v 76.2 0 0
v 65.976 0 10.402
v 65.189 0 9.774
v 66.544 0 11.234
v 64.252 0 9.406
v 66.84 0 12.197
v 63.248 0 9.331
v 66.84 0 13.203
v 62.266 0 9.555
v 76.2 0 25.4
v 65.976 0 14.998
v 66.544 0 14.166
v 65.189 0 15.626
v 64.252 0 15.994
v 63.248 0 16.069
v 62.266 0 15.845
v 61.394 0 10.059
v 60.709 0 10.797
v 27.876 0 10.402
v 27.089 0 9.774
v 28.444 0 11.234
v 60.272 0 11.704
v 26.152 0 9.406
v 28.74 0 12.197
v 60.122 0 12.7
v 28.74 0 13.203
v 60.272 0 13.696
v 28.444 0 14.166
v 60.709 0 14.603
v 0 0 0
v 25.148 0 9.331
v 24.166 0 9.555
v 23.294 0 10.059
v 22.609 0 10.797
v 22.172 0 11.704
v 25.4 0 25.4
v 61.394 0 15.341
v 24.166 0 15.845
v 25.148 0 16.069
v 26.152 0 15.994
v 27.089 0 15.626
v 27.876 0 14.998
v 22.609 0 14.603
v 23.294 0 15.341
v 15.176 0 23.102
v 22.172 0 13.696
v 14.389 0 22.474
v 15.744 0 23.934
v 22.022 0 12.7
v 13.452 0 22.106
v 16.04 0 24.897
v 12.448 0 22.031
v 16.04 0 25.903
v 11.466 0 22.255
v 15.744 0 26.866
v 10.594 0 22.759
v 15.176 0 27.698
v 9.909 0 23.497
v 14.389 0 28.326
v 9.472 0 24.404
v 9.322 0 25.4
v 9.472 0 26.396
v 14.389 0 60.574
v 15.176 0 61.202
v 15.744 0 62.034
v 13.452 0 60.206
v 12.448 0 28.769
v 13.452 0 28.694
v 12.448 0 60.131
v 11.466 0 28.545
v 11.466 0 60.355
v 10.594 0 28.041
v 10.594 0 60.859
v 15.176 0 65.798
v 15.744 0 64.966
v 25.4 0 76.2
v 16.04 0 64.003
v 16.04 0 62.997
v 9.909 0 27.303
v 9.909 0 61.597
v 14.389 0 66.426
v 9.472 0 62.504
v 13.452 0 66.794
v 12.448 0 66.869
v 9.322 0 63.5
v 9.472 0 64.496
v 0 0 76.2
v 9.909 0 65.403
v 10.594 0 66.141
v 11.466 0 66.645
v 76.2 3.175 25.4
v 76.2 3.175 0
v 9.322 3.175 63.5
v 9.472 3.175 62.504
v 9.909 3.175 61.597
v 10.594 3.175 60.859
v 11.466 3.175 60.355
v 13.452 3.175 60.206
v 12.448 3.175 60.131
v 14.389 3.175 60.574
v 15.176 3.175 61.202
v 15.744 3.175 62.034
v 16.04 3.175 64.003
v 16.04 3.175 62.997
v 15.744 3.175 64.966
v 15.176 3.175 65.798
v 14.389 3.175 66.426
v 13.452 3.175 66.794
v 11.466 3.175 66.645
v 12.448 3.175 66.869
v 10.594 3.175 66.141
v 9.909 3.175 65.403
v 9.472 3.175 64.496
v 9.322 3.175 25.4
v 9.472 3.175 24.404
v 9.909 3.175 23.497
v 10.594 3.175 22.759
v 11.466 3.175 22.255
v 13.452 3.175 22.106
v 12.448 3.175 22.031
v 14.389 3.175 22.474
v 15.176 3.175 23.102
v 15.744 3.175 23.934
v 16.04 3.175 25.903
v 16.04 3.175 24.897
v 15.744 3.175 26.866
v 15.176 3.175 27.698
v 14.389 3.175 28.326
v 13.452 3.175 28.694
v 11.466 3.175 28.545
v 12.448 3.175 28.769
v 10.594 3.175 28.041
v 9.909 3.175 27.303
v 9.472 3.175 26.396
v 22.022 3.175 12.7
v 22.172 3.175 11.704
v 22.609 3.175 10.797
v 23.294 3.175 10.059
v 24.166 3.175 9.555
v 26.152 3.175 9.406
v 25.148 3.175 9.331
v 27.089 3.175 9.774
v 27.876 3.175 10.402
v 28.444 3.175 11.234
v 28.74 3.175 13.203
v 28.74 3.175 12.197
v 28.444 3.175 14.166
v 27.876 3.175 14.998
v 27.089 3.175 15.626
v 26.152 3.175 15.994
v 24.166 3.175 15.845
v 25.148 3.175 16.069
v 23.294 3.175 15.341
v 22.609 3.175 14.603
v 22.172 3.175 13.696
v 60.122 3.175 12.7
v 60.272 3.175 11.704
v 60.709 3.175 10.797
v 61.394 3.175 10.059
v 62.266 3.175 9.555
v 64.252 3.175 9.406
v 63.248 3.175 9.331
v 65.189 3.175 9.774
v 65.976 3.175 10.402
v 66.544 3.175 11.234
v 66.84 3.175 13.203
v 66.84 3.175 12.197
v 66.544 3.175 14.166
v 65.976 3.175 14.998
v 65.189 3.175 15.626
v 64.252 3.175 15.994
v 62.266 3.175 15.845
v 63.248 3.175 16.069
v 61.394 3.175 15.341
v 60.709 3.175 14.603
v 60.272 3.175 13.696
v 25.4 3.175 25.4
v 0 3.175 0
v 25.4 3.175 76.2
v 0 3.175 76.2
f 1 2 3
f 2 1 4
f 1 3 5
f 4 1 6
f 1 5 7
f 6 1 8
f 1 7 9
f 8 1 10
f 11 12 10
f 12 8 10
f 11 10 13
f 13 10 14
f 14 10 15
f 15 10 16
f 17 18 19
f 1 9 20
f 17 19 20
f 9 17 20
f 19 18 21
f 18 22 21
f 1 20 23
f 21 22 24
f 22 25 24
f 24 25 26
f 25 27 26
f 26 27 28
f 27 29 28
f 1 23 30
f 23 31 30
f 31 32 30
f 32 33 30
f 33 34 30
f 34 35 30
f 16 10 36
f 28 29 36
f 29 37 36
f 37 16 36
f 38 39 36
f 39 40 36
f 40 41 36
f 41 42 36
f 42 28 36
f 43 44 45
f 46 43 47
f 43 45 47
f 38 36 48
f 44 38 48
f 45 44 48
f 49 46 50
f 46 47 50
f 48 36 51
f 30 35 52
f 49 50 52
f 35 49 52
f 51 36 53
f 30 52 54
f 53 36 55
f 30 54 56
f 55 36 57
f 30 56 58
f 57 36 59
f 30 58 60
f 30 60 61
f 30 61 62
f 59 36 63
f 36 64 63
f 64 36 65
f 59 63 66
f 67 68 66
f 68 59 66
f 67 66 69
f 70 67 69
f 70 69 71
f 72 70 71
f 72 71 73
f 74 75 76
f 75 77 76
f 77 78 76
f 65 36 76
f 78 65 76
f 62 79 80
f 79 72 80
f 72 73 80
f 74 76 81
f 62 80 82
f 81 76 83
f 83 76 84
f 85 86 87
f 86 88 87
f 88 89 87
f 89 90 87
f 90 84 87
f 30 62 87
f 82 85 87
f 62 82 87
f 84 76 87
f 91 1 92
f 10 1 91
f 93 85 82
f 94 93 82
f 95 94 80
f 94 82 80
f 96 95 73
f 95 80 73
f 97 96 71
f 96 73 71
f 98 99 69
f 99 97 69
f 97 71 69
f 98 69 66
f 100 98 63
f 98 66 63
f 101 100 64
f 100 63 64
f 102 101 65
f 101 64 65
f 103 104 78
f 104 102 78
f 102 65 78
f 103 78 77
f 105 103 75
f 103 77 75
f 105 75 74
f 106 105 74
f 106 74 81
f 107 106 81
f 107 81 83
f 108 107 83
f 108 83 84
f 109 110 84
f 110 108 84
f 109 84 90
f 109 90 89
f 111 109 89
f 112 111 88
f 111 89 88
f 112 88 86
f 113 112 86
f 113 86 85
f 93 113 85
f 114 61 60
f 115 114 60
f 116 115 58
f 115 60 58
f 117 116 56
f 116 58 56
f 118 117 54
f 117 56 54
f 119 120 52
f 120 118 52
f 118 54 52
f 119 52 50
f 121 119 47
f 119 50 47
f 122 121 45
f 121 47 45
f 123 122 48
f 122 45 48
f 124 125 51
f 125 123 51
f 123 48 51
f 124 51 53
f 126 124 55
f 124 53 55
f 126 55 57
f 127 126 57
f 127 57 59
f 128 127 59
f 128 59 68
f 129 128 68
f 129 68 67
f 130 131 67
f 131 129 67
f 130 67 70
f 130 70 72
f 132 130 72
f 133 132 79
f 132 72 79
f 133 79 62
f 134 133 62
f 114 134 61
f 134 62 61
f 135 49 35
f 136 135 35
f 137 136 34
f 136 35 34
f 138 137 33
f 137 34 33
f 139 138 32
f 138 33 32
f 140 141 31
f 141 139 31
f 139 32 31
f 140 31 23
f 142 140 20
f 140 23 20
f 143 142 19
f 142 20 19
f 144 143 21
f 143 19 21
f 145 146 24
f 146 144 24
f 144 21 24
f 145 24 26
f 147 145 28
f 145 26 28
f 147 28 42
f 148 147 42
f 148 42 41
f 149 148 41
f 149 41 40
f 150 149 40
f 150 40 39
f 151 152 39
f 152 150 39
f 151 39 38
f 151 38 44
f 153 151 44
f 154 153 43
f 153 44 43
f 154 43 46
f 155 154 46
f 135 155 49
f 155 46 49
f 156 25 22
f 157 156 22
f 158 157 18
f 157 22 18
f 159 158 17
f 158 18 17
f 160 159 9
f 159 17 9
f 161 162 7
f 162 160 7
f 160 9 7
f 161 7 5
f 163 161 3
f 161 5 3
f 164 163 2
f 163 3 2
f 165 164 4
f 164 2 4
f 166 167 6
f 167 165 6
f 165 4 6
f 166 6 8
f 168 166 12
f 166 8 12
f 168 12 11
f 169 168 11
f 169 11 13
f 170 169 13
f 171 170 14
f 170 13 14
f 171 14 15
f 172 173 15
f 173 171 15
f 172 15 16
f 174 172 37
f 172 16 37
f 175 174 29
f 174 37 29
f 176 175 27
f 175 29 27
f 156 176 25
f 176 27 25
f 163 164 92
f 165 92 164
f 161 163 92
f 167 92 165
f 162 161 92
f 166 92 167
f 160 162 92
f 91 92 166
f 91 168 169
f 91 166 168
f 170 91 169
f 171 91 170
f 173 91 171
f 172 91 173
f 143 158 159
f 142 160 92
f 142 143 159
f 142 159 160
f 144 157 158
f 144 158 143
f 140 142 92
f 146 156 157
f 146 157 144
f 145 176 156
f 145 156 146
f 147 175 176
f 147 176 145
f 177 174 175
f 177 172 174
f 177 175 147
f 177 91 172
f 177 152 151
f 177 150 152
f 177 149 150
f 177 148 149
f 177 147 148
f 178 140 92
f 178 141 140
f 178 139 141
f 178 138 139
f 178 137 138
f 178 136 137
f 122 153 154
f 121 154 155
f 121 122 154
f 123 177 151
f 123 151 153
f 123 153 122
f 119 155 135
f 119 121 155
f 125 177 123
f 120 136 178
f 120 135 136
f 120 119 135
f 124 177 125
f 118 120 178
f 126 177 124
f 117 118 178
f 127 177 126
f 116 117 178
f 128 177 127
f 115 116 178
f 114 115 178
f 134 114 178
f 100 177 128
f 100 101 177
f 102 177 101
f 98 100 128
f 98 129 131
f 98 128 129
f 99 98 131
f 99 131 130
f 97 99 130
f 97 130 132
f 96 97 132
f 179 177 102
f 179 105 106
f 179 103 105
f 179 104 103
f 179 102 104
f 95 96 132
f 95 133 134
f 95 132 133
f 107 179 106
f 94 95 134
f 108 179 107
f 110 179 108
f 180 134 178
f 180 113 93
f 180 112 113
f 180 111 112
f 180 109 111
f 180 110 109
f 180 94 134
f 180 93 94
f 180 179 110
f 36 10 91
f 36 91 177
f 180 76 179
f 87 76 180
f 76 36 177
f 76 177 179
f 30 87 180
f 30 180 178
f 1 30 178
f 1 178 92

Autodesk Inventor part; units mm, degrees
ref_plane "YZ Plane" through (0, 0, 0) normal (1, 0, 0) x (0, 1, 0)
ref_plane "XZ Plane" through (0, 0, 0) normal (0, 1, 0) x (-1, 0, 0)
ref_plane "XY Plane" through (0, 0, 0) normal (0, 0, 1) x (1, 0, 0)
sketch "Sketch1" plane through (0, 0, 0) normal (0, 1, 0) x (-1, 0, 0)
  circle A0 centre (-63.5, 12.7) radius 3.3782
  circle A1 centre (-25.4, 12.7) radius 3.3782
  circle A2 centre (-12.7, 25.4) radius 3.3782
  circle A3 centre (-12.7, 63.5) radius 3.3782
  line L0 (0, 76.2) -> (0, 25.4)
  line L1 (-25.4, 76.2) -> (0, 76.2)
  line L2 (-25.4, 25.4) -> (-25.4, 76.2)
  line L3 (-76.2, 25.4) -> (-25.4, 25.4)
  line L4 (-76.2, 0) -> (-76.2, 25.4)
  line L5 (-28.829, 0) -> (-76.2, 0)
  line L6 (15.621, -25.4) -> (-28.829, -25.4)
  line L7 (-28.829, -25.4) -> (-28.829, 0)
  line L8 (0, 25.4) -> (15.621, 25.4)
  line L9 (15.621, 25.4) -> (15.621, -25.4)
  line L10 (15.621, -25.4) -> (15.621, -25.4)
  point P0 (0, 0)
  point P1 (0, 0)
  dimension "d32" = 15.621
  dimension "d44" = 50.8
extrude "Plate1" add sketch "Sketch1" along normal blind 3.175
sketch "Sketch7" plane through (0, 0, 0) normal (0, -1, 0) x (1, 0, 0)
  line L0 (28.829, -25.4) -> (-15.621, -25.4) projected
  line L1 (28.829, 0) -> (28.829, -25.4) projected
  line L2 (76.2, 0) -> (28.829, 0) projected
  line L3 (-15.621, 25.4) -> (0, 25.4) projected
  line L4 (0, 25.4) -> (0, 0)
  line L5 (0, 0) -> (28.829, 0)
  line L6 (-15.621, -25.4) -> (-15.621, 25.4)
extrude "Cut3" cut sketch "Sketch7" against normal blind 3.175
equation "\"d45\" = Thickness"
equation "\"BendRadius\" = Thickness"
equation "\"BendReliefWidth\" = Thickness"
equation "\"BendReliefDepth\" = 0.5 * Thickness"
equation "\"CornerReliefSize\" = 4 * Thickness"
equation "\"MinimumRemnant\" = 2 * Thickness"
equation "\"TransitionRadius\" = BendRadius"
equation "\"JacobiRadiusSize\" = BendRadius"
equation "\"GapSize\" = Thickness"
equation "\"d1\" = BendRadius"
equation "\"Thickness\" = 3.175"
properties part number "Gusset Connector 2"
